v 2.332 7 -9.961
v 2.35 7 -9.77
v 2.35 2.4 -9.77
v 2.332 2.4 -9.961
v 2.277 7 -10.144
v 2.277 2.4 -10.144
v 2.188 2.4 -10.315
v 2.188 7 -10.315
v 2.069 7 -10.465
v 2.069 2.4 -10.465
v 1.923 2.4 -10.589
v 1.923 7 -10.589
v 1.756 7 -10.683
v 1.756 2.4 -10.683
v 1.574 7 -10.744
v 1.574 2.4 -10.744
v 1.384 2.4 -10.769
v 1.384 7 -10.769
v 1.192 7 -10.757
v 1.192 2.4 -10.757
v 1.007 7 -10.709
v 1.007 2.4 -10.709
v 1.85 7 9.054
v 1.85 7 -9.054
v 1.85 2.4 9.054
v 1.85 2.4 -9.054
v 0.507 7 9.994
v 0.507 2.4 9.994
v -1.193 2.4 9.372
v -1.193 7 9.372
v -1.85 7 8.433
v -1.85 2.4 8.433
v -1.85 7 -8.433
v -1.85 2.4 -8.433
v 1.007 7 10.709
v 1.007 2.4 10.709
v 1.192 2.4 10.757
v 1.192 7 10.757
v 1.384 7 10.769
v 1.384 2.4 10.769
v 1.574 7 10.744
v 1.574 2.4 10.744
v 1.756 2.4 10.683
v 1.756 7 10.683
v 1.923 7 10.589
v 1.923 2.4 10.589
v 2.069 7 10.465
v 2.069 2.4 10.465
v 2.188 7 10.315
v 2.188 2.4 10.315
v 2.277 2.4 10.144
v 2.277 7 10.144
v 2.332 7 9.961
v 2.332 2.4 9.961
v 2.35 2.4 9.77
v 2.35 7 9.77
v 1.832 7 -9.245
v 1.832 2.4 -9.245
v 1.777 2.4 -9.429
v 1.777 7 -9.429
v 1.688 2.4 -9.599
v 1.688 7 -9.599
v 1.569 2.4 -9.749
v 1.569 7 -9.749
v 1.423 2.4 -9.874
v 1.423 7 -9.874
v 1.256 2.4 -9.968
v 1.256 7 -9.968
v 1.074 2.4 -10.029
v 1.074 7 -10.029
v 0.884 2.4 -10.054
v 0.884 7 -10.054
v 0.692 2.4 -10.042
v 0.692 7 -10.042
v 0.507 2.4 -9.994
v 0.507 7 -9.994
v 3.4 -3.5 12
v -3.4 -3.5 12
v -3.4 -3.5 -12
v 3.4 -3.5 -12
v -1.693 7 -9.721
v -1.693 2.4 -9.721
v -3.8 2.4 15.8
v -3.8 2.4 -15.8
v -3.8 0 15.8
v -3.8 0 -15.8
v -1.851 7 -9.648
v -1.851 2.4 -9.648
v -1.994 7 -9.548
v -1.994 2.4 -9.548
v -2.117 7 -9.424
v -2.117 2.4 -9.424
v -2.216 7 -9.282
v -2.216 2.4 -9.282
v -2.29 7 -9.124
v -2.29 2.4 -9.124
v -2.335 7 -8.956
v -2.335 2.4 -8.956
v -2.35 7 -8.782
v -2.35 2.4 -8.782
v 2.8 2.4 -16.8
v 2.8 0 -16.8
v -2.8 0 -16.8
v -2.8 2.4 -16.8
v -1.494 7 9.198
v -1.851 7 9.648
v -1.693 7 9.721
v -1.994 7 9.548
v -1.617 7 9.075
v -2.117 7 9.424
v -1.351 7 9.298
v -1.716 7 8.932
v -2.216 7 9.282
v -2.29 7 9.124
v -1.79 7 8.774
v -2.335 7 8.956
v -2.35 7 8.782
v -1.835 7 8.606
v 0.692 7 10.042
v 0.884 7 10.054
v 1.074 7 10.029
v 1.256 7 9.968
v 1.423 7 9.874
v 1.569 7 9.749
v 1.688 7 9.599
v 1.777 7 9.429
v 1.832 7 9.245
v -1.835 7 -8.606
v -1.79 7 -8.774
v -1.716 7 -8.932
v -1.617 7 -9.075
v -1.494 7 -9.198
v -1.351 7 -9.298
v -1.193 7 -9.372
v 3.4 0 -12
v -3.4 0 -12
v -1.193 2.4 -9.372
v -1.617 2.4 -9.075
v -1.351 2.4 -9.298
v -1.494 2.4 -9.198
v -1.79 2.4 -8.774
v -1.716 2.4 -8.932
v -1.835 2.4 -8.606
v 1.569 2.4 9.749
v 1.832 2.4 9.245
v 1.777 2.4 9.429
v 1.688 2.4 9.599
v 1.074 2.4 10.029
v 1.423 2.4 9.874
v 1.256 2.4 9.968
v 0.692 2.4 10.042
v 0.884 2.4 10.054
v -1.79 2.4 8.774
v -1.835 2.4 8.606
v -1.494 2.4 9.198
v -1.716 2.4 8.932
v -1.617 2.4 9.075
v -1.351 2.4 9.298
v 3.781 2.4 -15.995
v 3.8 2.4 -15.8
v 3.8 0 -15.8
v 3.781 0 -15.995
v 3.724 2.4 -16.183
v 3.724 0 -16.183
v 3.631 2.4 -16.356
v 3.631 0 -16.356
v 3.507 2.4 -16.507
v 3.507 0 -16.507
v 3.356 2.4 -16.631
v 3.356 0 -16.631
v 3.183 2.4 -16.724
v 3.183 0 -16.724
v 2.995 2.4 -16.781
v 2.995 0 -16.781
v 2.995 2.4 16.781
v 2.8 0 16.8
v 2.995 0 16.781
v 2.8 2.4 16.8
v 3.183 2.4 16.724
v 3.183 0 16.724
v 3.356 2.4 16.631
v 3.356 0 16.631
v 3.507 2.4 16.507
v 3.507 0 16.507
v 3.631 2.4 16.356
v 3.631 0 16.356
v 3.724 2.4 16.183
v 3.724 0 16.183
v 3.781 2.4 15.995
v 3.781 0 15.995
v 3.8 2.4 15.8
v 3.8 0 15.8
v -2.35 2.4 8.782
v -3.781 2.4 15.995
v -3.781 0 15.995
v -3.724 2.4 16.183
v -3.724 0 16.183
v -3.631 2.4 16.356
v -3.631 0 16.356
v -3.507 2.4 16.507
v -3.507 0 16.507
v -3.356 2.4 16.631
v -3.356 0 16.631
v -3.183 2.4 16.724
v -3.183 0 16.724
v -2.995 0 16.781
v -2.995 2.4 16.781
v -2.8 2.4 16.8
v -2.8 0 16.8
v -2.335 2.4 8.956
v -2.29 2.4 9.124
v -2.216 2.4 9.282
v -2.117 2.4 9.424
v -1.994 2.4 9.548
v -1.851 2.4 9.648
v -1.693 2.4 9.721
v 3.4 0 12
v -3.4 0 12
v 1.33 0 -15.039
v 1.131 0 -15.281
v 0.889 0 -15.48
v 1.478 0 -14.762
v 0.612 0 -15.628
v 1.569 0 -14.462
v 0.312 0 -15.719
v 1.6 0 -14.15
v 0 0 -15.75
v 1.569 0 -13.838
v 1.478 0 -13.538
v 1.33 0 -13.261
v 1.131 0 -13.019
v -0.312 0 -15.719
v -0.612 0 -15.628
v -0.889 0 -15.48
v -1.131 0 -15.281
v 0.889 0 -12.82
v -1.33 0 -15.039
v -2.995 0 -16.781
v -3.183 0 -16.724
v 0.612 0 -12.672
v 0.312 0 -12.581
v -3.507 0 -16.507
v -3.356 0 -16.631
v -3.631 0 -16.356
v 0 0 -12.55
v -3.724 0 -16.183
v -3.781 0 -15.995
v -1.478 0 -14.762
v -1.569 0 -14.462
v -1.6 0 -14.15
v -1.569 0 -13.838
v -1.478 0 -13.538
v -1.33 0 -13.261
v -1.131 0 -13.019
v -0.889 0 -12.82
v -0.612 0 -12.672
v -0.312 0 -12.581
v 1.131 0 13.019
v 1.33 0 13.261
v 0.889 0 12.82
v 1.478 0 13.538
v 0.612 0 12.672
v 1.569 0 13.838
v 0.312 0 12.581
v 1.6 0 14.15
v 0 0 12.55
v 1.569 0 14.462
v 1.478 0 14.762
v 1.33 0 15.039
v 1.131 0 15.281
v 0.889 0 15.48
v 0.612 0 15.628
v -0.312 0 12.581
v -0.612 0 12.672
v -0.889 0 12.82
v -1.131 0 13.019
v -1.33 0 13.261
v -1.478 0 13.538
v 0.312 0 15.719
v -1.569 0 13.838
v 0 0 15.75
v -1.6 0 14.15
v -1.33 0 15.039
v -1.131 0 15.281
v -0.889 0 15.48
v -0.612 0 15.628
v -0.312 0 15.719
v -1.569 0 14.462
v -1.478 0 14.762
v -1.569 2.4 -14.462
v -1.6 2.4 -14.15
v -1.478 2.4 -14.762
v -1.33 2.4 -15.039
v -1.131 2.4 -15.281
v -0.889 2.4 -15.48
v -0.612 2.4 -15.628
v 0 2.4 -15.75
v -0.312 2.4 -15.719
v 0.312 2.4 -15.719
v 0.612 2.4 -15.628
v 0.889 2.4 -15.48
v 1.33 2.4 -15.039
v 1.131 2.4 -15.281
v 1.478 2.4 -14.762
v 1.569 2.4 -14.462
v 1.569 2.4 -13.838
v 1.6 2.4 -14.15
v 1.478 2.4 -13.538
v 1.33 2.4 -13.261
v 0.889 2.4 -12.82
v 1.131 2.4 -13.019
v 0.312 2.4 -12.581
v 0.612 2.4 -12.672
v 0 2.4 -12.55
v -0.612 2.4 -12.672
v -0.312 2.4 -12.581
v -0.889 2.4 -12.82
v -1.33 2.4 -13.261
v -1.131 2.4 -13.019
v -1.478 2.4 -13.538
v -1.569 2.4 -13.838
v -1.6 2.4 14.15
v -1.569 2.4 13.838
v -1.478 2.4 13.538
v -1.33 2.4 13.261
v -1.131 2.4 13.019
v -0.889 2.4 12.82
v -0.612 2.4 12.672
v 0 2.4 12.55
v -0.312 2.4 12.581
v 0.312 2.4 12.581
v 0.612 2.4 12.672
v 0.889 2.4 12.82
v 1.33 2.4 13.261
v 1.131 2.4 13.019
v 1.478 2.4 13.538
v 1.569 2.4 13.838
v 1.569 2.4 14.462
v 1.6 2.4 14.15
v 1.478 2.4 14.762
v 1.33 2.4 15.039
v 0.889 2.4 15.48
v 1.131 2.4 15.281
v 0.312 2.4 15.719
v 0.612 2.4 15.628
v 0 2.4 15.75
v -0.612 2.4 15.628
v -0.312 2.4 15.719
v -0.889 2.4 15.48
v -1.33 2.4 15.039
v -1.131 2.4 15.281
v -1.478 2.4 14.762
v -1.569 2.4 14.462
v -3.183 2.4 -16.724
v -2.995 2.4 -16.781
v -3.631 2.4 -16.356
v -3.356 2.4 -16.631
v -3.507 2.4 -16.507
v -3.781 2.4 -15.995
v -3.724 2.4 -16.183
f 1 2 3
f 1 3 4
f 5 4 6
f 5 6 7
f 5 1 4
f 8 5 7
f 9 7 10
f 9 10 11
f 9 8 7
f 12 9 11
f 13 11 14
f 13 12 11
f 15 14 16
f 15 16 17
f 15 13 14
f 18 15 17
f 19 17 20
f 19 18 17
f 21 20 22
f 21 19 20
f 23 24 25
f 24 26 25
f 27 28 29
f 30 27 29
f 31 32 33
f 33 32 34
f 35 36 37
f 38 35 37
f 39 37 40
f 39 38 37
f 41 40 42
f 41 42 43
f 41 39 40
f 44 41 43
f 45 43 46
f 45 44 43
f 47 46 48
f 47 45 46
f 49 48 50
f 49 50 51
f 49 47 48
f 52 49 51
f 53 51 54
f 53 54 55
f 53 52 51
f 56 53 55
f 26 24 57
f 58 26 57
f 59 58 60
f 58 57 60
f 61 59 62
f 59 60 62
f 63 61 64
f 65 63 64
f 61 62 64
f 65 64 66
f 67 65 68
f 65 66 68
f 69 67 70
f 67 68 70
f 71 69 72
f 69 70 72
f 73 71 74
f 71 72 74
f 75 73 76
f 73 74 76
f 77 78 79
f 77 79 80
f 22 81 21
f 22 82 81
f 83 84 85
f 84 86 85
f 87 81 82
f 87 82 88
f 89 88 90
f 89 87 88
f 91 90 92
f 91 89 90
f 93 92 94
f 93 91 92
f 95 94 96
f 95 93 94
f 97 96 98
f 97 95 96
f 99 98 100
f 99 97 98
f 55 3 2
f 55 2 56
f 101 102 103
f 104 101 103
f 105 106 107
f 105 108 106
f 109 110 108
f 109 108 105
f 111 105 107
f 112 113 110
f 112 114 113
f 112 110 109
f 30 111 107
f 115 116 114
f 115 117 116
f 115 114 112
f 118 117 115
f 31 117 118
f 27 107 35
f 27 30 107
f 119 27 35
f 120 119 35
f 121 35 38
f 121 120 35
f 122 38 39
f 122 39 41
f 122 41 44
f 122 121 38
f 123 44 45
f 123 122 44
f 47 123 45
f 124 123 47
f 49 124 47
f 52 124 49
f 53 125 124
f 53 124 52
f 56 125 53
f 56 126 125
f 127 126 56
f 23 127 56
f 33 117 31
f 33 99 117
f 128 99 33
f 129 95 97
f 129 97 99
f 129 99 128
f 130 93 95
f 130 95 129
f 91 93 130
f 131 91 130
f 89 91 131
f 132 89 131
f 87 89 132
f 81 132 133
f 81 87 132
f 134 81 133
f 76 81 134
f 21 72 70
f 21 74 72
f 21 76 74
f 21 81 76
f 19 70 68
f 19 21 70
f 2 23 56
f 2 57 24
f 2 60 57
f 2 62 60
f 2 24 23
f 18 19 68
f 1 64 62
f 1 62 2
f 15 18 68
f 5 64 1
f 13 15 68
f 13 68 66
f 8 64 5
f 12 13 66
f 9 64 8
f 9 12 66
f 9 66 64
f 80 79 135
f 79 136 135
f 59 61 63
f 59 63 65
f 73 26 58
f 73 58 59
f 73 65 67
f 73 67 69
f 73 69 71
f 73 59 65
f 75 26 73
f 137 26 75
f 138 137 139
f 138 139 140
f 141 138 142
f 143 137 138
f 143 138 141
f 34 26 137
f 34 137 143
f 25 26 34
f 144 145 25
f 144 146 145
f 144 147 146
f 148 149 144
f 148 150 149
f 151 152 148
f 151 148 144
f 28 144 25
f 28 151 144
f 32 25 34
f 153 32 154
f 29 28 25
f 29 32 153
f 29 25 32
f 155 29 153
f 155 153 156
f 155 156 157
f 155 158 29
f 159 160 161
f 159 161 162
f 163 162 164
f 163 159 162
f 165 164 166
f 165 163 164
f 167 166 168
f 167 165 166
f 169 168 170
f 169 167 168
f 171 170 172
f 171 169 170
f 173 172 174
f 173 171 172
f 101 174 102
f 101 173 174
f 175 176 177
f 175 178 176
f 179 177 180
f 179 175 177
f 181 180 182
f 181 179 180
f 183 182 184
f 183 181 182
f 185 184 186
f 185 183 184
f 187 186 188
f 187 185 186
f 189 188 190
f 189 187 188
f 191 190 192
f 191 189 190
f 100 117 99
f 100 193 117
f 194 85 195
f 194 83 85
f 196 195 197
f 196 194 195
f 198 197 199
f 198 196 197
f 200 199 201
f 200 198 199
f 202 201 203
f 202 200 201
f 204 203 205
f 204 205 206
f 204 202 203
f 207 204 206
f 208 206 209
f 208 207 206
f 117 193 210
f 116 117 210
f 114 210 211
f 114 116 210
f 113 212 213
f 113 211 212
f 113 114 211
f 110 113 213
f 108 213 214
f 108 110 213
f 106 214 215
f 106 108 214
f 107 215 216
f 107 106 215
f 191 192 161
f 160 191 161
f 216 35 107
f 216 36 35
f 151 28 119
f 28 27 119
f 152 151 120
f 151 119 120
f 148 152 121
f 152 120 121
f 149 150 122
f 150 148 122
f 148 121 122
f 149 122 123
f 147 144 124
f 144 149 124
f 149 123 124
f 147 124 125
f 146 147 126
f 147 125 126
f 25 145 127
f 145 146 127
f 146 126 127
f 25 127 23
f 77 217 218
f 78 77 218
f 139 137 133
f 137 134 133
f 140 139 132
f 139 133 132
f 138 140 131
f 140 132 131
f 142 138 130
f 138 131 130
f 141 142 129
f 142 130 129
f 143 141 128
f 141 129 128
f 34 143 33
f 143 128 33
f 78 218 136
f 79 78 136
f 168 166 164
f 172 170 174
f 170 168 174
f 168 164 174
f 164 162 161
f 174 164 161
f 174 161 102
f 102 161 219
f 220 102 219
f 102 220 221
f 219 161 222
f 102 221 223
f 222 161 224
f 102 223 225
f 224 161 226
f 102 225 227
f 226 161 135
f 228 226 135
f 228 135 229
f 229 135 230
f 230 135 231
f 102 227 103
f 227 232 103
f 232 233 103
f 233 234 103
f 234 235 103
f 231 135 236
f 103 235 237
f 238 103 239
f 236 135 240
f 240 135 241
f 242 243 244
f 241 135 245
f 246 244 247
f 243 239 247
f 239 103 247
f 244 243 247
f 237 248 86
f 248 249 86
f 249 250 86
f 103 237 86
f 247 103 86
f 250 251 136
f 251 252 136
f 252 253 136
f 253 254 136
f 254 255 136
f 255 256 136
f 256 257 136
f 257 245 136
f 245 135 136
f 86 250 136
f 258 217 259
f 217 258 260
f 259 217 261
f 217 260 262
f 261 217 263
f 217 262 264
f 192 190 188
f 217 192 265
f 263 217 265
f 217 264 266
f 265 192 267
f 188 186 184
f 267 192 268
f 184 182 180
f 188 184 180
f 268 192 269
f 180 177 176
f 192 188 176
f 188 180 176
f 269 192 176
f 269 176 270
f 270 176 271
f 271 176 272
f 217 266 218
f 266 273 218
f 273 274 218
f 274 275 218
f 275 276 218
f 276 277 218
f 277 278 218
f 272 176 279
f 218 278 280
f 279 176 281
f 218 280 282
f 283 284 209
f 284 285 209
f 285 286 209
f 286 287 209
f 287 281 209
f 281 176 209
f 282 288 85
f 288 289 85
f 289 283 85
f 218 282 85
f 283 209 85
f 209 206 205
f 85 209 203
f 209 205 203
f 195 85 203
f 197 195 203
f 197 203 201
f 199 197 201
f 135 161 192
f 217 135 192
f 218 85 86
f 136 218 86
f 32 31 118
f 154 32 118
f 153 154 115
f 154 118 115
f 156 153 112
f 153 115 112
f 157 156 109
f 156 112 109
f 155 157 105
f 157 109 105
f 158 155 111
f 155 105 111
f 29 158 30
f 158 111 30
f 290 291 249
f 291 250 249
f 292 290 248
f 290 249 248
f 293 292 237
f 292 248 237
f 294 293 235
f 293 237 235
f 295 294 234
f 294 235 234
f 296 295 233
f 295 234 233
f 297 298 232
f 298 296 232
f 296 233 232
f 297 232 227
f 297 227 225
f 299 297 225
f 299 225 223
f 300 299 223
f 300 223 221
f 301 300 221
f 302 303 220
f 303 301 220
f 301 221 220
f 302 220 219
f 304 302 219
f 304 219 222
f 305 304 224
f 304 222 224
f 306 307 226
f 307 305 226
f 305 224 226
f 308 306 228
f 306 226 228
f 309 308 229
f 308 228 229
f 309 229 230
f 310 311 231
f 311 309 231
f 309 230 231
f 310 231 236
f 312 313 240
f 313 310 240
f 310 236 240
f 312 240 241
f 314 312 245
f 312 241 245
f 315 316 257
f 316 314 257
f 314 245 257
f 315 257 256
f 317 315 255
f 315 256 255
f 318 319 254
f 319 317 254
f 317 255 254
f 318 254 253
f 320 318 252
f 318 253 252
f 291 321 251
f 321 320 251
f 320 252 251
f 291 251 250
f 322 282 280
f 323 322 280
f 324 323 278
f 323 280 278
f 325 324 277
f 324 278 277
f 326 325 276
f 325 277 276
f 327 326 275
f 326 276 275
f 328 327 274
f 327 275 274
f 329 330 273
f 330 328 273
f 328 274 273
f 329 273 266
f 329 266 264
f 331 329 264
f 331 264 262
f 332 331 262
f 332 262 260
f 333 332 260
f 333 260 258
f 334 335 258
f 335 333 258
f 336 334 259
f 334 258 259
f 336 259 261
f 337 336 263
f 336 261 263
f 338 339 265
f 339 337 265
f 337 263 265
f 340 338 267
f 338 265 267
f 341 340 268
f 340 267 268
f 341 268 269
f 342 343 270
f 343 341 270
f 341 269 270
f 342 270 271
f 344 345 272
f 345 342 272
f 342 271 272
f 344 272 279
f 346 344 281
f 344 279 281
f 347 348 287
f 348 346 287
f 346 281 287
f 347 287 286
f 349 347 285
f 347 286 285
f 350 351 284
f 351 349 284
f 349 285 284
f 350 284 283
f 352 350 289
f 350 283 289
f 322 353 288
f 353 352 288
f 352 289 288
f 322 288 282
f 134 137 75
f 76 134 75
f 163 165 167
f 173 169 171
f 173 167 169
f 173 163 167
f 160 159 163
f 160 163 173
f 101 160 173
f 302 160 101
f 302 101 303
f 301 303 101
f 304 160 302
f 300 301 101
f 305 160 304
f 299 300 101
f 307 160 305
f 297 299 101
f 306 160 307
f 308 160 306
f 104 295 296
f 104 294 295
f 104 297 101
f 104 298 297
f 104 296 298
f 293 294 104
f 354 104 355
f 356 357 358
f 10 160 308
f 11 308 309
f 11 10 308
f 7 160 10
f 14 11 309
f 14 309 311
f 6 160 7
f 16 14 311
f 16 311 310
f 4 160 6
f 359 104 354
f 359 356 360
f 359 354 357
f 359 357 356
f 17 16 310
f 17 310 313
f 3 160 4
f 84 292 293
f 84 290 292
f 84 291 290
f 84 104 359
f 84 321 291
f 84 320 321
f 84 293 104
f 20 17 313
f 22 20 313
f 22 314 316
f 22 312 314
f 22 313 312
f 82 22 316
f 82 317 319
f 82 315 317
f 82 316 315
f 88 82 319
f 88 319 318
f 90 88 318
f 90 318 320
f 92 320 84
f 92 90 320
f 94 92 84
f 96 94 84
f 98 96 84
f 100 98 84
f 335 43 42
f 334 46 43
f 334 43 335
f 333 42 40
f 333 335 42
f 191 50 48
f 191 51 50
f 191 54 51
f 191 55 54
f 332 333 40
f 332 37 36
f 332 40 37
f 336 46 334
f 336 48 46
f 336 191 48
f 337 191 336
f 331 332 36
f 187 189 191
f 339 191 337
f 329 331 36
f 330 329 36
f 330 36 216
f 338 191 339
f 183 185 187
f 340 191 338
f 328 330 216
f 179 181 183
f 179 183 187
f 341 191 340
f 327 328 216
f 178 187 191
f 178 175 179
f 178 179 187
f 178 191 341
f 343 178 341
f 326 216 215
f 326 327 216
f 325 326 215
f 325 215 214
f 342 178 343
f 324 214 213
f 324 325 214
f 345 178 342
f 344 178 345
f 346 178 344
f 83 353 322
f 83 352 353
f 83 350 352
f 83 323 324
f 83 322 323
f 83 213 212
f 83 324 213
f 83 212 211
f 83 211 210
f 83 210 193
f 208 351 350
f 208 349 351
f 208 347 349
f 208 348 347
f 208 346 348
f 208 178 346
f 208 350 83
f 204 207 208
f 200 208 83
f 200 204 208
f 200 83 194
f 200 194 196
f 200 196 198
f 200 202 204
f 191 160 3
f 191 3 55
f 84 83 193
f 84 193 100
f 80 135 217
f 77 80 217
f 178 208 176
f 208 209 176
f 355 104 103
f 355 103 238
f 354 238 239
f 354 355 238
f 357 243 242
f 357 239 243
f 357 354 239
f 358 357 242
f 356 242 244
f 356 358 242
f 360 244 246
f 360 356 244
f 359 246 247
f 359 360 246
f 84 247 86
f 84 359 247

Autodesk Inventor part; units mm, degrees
ref_plane "YZ Plane" through (0, 0, 0) normal (1, 0, 0) x (0, 1, 0)
ref_plane "XZ Plane" through (0, 0, 0) normal (0, 1, 0) x (-1, 0, 0)
ref_plane "XY Plane" through (0, 0, 0) normal (0, 0, 1) x (1, 0, 0)
sketch "Sketch1" plane through (0, 0, 0) normal (0, 1, 0) x (-1, 0, 0)
  line L0 (3.8, 16.8) -> (-3.8, 16.8)
  line L1 (-3.8, 16.8) -> (-3.8, -16.8)
  line L2 (-3.8, -16.8) -> (3.8, -16.8)
  line L3 (3.8, -16.8) -> (3.8, 16.8)
  circle A0 centre (0, 14.15) radius 1.6
  circle A1 centre (0, -14.15) radius 1.6
  point P0 (0, 0)
  dimension "d0" = 33.6
  dimension "d1" = 7.6
  dimension "d2" = 16.8
  dimension "d3" = 3.8
  dimension "d4" = 3.2
  dimension "d5" = 3.2
  dimension "d6" = 28.3
  dimension "d7" = 14.15
extrude "Extrusion1" add sketch "Sketch1" along normal blind 2.4
fillet "Fillet1" radius 1 4 edges at (3.8, 1.2, 16.8) (-3.8, 1.2, 16.8) (3.8, 1.2, -16.8) (-3.8, 1.2, -16.8)
sketch "Sketch2" plane through (0, 2.4, 0) normal (0, 1, 0) x (1, 0, 0)
  line L0 (-2.35, -9.4813) -> (-2.35, 9.4813)
  line L1 (-2.35, 9.4813) -> (2.35, 11.2)
  line L2 (2.35, 11.2) -> (2.35, -11.2)
  line L3 (2.35, -11.2) -> (-2.35, -9.4813)
  line L4 (1.85, -10.4848) -> (-1.85, -9.1318)
  line L5 (-1.85, -9.1318) -> (-1.85, 9.1318)
  line L6 (-1.85, 9.1318) -> (1.85, 10.4848)
  line L7 (1.85, 10.4848) -> (1.85, -10.4848)
  point P0 (0, 0)
  dimension "d11" = 69.914
  dimension "d13" = 22.4
  dimension "d14" = 4.7
  dimension "d15" = 2.35
  dimension "d17" = 0.5
  dimension "d18" = 0.5
  dimension "d19" = 0.5
  dimension "d20" = 0.5
  dimension "d21" = 11.2
  dimension "d22" = 69.914
  dimension "d23" = 69.914
extrude "Extrusion2" add sketch "Sketch2" along normal blind 4.6
fillet "Fillet2" radius 1 8 edges at (-2.35, 4.7, -9.4813) (-2.35, 4.7, 9.4813) (2.35, 4.7, 11.2) (2.35, 4.7, -11.2) (-1.85, 4.7, -9.1318) (-1.85, 4.7, 9.1318) (1.85, 4.7, -10.4848) (1.85, 4.7, 10.4848)
sketch "Sketch3" plane through (0, 0, 0) normal (0, -1, 0) x (1, 0, 0)
  line L0 (3.4, 12) -> (-3.4, 12)
  line L1 (-3.4, 12) -> (-3.4, -12)
  line L2 (-3.4, -12) -> (3.4, -12)
  line L3 (3.4, -12) -> (3.4, 12)
  point P0 (0, 0)
  dimension "d27" = 24
  dimension "d28" = 6.8
  dimension "d29" = 12
  dimension "d30" = 3.4
extrude "Extrusion3" add sketch "Sketch3" along normal blind 3.5
equation "\"d2\" = 0.5 * d0"
equation "\"d3\" = 0.5 * d1"
equation "\"d5\" = d4"
equation "\"d7\" = 0.5 * d6"
equation "\"d15\" = 0.5 * d14"
equation "\"d21\" = 0.5 * d13"
equation "\"d22\" = d11"
equation "\"d29\" = 0.5 * d27"
equation "\"d30\" = 0.5 * d28"
properties part number "31pin male connector"
